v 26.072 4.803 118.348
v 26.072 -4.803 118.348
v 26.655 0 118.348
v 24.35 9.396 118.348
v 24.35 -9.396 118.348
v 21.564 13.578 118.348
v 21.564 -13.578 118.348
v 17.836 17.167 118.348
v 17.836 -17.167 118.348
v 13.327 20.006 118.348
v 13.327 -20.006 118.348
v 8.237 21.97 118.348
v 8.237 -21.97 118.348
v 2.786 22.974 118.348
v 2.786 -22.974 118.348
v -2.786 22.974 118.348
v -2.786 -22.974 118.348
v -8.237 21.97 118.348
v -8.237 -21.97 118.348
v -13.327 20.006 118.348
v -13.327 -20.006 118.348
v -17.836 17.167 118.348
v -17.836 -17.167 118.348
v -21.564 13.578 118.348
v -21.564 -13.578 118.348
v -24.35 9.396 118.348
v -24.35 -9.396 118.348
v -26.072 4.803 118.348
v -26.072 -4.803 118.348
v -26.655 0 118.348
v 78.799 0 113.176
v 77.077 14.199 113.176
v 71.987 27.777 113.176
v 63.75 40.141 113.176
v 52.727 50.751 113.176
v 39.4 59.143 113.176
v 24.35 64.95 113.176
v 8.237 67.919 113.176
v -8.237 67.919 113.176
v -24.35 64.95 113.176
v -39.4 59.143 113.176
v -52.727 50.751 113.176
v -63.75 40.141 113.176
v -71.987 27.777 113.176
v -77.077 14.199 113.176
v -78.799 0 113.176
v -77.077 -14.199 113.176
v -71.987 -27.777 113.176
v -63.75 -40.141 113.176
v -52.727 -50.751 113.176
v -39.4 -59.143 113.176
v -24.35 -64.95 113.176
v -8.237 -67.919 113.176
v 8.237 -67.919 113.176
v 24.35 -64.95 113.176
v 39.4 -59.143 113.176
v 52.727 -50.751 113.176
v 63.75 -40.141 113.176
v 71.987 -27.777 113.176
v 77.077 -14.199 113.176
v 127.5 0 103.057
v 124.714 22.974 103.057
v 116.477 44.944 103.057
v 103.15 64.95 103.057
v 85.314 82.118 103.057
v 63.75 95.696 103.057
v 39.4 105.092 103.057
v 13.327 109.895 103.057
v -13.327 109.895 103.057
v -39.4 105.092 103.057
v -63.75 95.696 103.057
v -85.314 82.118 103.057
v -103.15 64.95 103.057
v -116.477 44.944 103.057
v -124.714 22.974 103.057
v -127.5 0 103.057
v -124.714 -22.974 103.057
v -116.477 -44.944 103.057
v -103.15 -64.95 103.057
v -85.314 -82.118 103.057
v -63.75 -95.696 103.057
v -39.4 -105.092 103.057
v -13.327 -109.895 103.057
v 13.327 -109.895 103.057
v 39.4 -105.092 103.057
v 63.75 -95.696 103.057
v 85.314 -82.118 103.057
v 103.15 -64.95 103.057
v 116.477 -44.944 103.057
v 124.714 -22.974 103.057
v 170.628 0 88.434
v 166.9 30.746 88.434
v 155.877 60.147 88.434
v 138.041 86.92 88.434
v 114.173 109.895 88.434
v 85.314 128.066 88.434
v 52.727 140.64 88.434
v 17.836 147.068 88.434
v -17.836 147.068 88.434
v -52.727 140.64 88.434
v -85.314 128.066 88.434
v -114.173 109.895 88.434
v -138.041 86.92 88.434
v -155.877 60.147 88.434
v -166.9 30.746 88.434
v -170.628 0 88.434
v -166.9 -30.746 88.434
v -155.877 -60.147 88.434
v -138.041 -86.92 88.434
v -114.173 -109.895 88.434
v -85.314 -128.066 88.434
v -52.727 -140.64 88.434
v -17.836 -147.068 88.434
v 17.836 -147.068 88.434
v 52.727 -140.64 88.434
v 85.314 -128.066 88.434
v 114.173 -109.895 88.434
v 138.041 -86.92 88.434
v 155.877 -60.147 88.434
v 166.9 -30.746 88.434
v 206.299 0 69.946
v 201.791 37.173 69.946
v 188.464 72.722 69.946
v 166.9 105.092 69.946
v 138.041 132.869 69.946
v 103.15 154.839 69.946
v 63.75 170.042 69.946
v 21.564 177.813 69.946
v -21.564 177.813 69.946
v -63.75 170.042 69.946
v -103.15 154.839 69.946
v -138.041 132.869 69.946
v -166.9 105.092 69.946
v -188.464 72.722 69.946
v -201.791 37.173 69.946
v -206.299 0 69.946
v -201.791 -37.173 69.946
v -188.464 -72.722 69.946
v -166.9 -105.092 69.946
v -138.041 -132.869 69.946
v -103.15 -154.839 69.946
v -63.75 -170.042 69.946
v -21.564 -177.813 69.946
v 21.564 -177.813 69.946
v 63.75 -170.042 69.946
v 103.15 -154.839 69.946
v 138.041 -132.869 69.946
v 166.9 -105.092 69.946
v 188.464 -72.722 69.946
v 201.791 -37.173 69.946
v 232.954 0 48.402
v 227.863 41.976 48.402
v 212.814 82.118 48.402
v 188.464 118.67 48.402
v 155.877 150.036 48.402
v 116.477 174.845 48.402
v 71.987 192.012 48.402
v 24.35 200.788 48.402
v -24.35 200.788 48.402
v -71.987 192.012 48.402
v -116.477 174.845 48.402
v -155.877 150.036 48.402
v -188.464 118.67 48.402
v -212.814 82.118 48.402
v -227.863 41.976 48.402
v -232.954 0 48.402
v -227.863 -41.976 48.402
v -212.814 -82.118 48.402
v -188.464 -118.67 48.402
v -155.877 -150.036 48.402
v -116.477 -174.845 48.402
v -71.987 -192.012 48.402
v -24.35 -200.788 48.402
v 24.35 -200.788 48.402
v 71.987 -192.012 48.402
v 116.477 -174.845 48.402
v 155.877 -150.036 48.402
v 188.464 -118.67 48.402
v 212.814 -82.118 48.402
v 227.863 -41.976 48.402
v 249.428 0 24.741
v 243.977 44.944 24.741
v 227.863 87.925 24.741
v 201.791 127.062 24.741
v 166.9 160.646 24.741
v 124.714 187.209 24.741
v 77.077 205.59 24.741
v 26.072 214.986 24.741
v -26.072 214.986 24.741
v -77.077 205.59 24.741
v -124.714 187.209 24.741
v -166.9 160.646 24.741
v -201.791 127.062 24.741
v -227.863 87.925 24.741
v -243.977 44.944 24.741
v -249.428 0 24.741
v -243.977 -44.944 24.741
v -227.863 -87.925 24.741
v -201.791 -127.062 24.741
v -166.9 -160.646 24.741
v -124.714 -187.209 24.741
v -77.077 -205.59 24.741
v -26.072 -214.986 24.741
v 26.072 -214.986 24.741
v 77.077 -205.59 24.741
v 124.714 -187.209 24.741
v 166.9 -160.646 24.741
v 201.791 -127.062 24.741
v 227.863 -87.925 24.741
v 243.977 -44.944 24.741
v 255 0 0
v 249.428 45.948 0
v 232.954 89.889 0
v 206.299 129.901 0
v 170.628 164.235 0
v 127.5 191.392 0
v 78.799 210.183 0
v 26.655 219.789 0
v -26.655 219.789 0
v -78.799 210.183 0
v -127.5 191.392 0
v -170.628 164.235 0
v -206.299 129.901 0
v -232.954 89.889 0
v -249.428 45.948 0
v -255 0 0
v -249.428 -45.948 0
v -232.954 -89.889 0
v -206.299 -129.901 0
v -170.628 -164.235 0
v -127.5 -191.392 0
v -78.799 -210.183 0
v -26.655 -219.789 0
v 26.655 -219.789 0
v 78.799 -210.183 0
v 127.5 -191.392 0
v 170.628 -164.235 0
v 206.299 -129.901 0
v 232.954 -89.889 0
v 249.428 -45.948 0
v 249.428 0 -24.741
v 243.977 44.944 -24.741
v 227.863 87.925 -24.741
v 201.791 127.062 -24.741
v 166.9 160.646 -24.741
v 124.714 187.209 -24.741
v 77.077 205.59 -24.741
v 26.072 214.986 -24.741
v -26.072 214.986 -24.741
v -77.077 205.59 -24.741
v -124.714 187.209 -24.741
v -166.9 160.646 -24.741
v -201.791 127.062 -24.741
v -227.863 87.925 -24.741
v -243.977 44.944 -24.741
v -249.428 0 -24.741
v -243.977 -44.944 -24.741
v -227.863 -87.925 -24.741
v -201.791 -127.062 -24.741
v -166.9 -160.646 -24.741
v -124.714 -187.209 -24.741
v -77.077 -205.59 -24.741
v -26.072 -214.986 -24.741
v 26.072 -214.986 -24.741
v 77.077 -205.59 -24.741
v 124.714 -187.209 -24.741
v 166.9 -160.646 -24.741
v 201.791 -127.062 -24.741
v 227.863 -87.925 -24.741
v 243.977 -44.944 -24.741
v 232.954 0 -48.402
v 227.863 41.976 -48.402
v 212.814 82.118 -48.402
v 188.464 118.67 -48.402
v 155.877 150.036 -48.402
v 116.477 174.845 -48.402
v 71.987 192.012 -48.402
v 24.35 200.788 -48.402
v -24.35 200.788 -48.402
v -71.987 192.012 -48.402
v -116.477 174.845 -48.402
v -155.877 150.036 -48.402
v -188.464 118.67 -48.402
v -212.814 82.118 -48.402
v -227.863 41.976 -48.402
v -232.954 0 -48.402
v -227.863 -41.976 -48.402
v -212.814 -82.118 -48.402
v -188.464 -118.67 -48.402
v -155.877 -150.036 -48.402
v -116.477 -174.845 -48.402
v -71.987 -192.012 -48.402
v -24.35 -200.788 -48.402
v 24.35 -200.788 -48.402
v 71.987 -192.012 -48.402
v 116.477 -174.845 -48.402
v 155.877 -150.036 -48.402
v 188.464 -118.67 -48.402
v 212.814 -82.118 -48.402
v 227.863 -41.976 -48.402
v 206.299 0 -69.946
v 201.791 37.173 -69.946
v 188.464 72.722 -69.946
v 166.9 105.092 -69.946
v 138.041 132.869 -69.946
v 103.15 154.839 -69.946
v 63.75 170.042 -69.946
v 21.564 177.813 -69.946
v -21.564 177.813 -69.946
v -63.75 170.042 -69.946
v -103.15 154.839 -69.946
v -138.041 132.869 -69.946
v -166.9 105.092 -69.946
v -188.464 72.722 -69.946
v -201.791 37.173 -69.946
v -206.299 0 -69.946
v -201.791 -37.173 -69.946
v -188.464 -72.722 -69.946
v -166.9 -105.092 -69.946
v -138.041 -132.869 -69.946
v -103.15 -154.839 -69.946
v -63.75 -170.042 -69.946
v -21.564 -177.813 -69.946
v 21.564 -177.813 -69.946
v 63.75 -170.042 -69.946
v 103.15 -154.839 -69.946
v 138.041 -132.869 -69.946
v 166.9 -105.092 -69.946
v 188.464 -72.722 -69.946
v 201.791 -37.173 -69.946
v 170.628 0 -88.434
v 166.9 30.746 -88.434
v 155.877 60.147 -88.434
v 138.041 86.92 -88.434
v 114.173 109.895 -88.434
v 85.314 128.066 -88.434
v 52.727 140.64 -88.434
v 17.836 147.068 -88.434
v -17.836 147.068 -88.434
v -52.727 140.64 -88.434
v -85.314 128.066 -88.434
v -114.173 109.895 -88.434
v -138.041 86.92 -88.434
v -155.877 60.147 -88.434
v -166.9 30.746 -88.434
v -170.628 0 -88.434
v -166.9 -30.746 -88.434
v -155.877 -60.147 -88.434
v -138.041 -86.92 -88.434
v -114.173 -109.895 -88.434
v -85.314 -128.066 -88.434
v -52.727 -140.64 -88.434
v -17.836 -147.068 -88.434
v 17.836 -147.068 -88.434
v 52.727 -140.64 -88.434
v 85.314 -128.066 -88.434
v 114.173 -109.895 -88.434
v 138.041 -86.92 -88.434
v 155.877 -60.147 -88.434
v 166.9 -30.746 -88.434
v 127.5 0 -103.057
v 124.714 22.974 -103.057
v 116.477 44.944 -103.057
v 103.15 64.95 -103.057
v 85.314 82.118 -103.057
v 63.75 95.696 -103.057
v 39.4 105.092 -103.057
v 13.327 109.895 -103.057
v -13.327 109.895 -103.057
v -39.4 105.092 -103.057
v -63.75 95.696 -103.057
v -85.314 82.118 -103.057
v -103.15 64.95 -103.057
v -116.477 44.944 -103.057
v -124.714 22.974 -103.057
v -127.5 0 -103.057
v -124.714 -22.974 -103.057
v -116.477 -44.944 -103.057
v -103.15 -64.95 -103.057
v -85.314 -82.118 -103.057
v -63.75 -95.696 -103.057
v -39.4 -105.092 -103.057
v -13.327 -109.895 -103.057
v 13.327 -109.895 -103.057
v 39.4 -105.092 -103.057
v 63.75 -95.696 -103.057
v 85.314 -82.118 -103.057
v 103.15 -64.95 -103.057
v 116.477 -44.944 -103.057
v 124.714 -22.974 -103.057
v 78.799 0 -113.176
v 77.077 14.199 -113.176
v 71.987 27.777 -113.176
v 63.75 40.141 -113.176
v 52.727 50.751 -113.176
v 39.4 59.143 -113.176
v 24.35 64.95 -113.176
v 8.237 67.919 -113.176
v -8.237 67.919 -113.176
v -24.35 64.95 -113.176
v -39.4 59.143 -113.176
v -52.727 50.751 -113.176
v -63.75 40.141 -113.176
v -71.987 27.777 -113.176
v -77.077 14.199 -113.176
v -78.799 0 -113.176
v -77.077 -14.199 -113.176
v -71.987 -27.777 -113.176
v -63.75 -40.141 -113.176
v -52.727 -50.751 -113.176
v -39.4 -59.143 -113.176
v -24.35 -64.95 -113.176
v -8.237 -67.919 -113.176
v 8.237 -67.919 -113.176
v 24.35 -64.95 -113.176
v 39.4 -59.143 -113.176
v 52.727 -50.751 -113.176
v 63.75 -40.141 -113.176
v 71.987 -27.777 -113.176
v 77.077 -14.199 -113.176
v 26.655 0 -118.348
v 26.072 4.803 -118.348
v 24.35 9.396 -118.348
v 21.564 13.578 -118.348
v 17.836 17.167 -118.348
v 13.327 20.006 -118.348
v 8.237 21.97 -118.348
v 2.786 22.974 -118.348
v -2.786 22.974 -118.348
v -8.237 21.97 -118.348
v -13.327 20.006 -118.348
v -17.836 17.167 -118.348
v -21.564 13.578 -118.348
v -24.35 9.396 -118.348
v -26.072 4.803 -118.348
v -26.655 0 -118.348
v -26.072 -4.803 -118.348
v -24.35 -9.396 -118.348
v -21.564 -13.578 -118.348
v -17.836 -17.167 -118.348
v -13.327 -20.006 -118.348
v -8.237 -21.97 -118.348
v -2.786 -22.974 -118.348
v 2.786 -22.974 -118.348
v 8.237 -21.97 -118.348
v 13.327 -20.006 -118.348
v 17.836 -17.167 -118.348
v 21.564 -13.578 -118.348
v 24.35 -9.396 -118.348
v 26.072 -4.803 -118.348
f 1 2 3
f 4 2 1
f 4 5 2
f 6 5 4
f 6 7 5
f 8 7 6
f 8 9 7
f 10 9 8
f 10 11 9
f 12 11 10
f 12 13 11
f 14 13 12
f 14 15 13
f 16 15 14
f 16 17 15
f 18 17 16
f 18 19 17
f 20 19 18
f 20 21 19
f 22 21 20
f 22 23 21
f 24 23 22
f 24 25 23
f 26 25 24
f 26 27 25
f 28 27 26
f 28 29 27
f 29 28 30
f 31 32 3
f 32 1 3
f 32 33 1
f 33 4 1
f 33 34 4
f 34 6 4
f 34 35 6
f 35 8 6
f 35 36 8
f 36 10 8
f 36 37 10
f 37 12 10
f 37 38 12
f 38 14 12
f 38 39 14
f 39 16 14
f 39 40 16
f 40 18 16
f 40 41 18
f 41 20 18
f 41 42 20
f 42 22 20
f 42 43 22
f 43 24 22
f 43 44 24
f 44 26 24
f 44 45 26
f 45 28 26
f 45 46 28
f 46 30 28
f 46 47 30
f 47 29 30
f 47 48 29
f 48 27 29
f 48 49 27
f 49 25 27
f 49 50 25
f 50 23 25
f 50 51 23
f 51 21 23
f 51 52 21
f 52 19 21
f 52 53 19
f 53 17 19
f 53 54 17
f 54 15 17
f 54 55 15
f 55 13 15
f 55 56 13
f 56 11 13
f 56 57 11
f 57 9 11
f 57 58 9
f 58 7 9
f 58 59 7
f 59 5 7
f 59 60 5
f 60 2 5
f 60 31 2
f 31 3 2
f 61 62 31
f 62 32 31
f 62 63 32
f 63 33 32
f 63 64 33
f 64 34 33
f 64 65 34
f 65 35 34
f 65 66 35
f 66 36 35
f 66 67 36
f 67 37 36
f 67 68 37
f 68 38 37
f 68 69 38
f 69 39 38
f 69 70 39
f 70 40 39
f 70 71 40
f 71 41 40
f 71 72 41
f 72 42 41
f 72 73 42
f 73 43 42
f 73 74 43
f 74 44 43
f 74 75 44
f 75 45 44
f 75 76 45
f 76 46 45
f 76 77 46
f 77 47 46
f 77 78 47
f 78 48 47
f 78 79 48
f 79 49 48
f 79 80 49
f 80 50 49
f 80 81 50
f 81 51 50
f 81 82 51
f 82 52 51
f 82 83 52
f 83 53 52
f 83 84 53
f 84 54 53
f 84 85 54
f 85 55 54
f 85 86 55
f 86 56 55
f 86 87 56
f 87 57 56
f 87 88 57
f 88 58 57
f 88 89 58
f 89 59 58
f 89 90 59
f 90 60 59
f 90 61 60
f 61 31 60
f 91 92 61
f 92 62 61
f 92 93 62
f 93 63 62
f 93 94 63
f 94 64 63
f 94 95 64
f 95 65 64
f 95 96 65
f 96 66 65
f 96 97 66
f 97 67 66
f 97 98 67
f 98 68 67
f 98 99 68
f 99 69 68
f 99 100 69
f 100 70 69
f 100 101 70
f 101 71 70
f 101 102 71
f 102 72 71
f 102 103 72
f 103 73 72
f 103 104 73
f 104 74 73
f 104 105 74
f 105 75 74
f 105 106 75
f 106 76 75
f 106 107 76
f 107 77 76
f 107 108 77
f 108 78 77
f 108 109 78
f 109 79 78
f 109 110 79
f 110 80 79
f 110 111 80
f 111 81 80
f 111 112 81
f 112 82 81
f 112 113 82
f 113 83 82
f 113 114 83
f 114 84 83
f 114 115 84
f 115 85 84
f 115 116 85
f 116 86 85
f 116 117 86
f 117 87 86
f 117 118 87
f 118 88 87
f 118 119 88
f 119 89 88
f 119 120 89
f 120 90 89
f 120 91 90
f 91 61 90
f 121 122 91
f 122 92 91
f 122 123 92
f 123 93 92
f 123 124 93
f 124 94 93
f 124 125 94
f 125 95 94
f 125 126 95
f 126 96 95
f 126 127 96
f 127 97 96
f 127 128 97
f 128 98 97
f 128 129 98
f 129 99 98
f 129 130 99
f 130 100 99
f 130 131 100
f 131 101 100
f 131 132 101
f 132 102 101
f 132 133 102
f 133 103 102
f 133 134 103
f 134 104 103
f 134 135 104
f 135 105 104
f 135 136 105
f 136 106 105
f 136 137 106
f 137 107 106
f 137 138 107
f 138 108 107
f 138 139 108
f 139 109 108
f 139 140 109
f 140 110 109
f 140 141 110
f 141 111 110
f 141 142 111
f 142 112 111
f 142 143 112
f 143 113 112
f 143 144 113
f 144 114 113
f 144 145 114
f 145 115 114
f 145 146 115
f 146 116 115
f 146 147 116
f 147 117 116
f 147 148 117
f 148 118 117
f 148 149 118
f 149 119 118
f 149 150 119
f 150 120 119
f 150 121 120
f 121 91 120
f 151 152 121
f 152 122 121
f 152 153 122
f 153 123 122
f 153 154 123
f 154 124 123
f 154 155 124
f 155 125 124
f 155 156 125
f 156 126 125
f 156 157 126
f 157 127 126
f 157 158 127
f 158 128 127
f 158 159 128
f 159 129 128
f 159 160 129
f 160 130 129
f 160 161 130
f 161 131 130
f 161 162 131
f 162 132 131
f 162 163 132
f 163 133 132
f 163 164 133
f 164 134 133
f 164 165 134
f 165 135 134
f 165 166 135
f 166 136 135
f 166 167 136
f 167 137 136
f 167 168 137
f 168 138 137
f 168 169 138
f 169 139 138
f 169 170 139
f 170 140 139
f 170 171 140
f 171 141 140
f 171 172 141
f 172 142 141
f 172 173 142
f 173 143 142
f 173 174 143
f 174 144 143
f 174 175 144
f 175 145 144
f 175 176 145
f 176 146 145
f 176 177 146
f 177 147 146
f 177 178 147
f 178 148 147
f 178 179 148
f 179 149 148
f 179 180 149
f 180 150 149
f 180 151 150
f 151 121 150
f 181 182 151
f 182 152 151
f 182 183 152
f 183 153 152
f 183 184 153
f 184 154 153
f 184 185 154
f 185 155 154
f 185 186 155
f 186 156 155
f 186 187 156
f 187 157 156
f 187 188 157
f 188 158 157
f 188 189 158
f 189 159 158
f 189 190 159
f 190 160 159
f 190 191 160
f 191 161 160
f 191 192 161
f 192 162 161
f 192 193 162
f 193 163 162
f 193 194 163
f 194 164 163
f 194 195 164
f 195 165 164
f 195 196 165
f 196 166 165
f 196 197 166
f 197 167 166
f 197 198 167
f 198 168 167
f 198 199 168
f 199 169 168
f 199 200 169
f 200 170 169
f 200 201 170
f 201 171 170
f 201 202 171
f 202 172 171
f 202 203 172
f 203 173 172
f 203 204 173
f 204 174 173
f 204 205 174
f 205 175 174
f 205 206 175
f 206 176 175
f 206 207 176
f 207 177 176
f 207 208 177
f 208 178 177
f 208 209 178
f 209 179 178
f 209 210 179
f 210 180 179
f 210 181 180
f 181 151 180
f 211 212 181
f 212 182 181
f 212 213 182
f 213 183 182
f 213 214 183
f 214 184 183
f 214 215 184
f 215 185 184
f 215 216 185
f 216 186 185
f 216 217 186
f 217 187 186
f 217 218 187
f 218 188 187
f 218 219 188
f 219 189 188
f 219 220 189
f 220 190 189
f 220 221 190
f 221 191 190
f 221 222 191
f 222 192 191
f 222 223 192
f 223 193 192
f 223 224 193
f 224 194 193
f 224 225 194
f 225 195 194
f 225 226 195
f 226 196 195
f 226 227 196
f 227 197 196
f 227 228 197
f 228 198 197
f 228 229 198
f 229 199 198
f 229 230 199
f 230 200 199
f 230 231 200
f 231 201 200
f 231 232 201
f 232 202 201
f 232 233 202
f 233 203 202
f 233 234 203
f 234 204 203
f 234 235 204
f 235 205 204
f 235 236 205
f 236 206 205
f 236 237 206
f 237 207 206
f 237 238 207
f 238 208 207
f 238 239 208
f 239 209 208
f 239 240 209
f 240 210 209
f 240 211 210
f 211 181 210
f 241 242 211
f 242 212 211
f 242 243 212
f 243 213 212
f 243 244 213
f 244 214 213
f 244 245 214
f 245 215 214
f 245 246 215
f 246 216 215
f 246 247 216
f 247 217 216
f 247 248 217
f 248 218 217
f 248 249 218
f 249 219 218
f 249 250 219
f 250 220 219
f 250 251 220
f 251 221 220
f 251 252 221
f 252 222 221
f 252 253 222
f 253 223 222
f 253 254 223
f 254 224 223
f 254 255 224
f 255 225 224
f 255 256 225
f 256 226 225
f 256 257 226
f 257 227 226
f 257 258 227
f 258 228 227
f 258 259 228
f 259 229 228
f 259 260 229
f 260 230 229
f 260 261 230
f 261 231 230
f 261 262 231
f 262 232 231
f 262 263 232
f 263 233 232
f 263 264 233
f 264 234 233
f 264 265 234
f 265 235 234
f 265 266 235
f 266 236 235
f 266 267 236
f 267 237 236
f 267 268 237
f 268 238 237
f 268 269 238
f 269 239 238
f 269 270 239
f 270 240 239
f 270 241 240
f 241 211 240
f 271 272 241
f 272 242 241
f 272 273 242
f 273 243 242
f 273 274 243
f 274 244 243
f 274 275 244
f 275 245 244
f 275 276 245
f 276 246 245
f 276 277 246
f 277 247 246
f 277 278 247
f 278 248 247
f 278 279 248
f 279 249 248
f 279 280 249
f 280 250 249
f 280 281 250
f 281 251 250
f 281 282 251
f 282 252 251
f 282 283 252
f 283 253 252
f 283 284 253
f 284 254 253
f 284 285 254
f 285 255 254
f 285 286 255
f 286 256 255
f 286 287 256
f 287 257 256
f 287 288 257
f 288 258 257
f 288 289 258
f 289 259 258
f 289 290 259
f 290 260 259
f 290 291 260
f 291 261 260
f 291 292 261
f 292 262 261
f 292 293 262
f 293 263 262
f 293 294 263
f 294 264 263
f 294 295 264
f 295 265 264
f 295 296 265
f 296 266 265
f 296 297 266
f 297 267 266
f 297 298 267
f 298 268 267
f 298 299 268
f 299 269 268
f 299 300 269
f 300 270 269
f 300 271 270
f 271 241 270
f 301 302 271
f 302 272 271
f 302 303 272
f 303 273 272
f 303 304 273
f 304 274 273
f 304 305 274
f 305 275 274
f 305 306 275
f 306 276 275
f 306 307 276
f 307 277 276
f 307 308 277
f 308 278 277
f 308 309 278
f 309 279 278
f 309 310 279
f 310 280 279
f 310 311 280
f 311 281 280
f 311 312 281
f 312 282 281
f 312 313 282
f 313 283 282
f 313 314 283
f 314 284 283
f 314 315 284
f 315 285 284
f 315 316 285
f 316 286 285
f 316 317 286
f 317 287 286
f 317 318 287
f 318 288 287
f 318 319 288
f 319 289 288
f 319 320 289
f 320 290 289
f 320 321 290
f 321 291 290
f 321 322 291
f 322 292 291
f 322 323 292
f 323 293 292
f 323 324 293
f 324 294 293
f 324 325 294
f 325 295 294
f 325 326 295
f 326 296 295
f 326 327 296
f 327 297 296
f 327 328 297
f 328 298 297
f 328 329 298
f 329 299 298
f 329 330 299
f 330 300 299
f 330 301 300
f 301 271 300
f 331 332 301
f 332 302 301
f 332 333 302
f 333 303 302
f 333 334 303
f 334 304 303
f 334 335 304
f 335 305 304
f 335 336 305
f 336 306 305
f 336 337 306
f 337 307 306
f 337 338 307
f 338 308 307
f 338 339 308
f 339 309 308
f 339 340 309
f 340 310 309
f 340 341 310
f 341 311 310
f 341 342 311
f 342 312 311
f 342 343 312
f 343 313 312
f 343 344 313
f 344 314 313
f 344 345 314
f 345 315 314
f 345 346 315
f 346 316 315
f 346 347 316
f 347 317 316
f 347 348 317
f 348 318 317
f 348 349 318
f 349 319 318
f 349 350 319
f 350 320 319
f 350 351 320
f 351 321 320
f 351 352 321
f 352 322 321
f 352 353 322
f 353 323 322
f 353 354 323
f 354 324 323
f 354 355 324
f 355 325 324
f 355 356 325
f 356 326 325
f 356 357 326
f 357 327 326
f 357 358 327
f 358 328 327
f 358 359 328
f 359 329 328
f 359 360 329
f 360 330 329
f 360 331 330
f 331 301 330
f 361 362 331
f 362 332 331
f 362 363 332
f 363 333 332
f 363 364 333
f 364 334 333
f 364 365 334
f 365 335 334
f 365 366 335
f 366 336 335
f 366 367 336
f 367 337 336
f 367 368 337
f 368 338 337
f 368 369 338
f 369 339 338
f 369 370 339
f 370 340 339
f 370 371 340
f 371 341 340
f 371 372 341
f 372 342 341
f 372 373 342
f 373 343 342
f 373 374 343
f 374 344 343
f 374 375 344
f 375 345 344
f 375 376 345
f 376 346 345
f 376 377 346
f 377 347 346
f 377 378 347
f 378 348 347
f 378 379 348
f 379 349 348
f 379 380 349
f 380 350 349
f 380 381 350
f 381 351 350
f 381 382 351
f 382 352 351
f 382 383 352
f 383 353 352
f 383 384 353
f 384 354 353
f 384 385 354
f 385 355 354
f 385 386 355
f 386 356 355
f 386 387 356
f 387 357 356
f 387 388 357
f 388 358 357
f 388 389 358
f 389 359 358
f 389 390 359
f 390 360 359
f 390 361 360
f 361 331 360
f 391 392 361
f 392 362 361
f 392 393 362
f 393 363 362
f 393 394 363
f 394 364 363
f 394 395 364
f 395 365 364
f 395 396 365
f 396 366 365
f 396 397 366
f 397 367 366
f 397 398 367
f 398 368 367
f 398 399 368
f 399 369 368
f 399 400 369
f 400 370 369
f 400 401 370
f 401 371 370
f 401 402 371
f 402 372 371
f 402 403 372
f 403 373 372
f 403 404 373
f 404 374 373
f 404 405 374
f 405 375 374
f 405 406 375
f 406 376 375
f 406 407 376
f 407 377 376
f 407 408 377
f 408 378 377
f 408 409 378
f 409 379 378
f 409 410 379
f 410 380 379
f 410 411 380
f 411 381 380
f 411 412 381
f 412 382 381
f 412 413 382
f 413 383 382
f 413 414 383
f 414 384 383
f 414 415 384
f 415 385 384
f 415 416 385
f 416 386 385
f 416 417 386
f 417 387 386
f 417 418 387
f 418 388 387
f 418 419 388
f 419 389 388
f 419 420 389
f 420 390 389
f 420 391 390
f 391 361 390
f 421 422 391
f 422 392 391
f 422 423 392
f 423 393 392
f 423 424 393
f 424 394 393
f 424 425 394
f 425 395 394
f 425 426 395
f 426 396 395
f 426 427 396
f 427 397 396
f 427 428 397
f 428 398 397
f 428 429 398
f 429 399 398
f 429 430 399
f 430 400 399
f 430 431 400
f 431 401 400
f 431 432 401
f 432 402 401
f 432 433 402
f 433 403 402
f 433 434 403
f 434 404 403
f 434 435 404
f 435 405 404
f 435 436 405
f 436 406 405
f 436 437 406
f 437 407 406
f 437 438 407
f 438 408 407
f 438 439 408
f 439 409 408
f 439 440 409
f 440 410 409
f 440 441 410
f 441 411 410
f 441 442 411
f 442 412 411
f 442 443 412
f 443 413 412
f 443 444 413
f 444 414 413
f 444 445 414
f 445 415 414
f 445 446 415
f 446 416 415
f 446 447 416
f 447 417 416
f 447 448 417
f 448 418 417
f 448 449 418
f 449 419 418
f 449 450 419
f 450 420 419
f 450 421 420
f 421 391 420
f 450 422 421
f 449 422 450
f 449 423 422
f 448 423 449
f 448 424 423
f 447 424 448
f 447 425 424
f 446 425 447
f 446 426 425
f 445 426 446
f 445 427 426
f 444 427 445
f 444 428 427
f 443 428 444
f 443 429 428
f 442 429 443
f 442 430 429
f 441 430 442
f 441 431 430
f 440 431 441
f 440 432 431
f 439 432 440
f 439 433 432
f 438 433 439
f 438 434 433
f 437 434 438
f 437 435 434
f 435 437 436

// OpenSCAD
// Generated by SolidPython 1.0.1 on 2020-07-29 00:46:52


scale(v = [15, 13, 7]) {
	sphere(r = 17);
}
/***********************************************
*********      SolidPython code:      **********
************************************************
 
# import packages: SolidPython
from solid import *
from solid.utils import *
from itertools import chain, combinations, permutations


class Resize:

    def __init__(self, scad_file):
        self.scad_file = scad_file
        #self.scad_file = import_scad(scad_file)
        # cone/cylinder param:
        self.r1 = 0
        self.r2 = 0
        self.h = 0
        # rectangular prism param:
        self.w = 0
        self.l = 0
        # ellipse param:
        self.r = 0

    # import OpenScad code (file name corresponds to shape)


    # classify shape + parameters
    def assign(self, param1, param2, param3):
        if self.scad_file == 'cone.scad':
            self.r1 = param1
            self.r2 = param2
            self.h = param3
        elif self.scad_file == 'cylinder.scad':
            self.r1 = param1
            self.r2 = param2
            self.h = param3
        elif self.scad_file == 'rectangularPrism.scad':
            self.h = param1
            self.l = param2
            self.w = param3
        else:
            self.r = param1
            self.h = param2

    # resize parameters
    def iterate(self):
        x = range(3, 20, 2)
        i = 1
        if self.scad_file == 'cone.scad':
            tempList = list(permutations(x, 2))
            for temp in tempList:
                param1 = temp[0]
                param2 = temp[1]
                filepath = 'produced_scad_files/' + 'cone' + str(param1) + '_' + str(param2) + '_' + '.scad'
                scad_render_to_file(cylinder(h=param1, r1=param2, r2=0), filepath)

        elif self.scad_file == 'cylinder.scad':
            tempList = list(permutations(x, 3))
            for temp in tempList:
                param1 = temp[0]
                param2 = temp[1]
                filepath = 'produced_scad_files/' + 'cylinder' + str(param1) + '_' + str(param2) + '_' + '.scad'
                scad_render_to_file(cylinder(h=param1, r1=param2, r2=param2), filepath)

        elif self.scad_file == 'rectangularPrism.scad':
            tempList = list(permutations(x, 3))
            for temp in tempList:
                param1 = temp[0]
                param2 = temp[1]
                param3 = temp[2]
                filepath = 'produced_scad_files/' + 'rectangularPrism' + str(param1) + '_' + str(param2) + '_' + str(
                    param3) + '.scad'
                scad_render_to_file(cube(size=(param1, param2, param3)), filepath)

        elif self.scad_file == 'ellipse.scad':
            tempList = list(permutations(x, 4))
            for temp in tempList:
                param1 = temp[0]
                param2 = temp[1]
                param3 = temp[2]
                param4 = temp[3]
                filepath = 'produced_scad_files/' + 'ellipse' + str(param1) + '_' + str(param2) + '_' + str(param3) + '_' + str(param4) + '.scad'
                scad_render_to_file(scale([param1, param2, param3])(sphere(r=param4)), filepath)

    def render_to_scadfile(self):
        scad_render_to_file(scad, 'example.scad') 
 
************************************************/
